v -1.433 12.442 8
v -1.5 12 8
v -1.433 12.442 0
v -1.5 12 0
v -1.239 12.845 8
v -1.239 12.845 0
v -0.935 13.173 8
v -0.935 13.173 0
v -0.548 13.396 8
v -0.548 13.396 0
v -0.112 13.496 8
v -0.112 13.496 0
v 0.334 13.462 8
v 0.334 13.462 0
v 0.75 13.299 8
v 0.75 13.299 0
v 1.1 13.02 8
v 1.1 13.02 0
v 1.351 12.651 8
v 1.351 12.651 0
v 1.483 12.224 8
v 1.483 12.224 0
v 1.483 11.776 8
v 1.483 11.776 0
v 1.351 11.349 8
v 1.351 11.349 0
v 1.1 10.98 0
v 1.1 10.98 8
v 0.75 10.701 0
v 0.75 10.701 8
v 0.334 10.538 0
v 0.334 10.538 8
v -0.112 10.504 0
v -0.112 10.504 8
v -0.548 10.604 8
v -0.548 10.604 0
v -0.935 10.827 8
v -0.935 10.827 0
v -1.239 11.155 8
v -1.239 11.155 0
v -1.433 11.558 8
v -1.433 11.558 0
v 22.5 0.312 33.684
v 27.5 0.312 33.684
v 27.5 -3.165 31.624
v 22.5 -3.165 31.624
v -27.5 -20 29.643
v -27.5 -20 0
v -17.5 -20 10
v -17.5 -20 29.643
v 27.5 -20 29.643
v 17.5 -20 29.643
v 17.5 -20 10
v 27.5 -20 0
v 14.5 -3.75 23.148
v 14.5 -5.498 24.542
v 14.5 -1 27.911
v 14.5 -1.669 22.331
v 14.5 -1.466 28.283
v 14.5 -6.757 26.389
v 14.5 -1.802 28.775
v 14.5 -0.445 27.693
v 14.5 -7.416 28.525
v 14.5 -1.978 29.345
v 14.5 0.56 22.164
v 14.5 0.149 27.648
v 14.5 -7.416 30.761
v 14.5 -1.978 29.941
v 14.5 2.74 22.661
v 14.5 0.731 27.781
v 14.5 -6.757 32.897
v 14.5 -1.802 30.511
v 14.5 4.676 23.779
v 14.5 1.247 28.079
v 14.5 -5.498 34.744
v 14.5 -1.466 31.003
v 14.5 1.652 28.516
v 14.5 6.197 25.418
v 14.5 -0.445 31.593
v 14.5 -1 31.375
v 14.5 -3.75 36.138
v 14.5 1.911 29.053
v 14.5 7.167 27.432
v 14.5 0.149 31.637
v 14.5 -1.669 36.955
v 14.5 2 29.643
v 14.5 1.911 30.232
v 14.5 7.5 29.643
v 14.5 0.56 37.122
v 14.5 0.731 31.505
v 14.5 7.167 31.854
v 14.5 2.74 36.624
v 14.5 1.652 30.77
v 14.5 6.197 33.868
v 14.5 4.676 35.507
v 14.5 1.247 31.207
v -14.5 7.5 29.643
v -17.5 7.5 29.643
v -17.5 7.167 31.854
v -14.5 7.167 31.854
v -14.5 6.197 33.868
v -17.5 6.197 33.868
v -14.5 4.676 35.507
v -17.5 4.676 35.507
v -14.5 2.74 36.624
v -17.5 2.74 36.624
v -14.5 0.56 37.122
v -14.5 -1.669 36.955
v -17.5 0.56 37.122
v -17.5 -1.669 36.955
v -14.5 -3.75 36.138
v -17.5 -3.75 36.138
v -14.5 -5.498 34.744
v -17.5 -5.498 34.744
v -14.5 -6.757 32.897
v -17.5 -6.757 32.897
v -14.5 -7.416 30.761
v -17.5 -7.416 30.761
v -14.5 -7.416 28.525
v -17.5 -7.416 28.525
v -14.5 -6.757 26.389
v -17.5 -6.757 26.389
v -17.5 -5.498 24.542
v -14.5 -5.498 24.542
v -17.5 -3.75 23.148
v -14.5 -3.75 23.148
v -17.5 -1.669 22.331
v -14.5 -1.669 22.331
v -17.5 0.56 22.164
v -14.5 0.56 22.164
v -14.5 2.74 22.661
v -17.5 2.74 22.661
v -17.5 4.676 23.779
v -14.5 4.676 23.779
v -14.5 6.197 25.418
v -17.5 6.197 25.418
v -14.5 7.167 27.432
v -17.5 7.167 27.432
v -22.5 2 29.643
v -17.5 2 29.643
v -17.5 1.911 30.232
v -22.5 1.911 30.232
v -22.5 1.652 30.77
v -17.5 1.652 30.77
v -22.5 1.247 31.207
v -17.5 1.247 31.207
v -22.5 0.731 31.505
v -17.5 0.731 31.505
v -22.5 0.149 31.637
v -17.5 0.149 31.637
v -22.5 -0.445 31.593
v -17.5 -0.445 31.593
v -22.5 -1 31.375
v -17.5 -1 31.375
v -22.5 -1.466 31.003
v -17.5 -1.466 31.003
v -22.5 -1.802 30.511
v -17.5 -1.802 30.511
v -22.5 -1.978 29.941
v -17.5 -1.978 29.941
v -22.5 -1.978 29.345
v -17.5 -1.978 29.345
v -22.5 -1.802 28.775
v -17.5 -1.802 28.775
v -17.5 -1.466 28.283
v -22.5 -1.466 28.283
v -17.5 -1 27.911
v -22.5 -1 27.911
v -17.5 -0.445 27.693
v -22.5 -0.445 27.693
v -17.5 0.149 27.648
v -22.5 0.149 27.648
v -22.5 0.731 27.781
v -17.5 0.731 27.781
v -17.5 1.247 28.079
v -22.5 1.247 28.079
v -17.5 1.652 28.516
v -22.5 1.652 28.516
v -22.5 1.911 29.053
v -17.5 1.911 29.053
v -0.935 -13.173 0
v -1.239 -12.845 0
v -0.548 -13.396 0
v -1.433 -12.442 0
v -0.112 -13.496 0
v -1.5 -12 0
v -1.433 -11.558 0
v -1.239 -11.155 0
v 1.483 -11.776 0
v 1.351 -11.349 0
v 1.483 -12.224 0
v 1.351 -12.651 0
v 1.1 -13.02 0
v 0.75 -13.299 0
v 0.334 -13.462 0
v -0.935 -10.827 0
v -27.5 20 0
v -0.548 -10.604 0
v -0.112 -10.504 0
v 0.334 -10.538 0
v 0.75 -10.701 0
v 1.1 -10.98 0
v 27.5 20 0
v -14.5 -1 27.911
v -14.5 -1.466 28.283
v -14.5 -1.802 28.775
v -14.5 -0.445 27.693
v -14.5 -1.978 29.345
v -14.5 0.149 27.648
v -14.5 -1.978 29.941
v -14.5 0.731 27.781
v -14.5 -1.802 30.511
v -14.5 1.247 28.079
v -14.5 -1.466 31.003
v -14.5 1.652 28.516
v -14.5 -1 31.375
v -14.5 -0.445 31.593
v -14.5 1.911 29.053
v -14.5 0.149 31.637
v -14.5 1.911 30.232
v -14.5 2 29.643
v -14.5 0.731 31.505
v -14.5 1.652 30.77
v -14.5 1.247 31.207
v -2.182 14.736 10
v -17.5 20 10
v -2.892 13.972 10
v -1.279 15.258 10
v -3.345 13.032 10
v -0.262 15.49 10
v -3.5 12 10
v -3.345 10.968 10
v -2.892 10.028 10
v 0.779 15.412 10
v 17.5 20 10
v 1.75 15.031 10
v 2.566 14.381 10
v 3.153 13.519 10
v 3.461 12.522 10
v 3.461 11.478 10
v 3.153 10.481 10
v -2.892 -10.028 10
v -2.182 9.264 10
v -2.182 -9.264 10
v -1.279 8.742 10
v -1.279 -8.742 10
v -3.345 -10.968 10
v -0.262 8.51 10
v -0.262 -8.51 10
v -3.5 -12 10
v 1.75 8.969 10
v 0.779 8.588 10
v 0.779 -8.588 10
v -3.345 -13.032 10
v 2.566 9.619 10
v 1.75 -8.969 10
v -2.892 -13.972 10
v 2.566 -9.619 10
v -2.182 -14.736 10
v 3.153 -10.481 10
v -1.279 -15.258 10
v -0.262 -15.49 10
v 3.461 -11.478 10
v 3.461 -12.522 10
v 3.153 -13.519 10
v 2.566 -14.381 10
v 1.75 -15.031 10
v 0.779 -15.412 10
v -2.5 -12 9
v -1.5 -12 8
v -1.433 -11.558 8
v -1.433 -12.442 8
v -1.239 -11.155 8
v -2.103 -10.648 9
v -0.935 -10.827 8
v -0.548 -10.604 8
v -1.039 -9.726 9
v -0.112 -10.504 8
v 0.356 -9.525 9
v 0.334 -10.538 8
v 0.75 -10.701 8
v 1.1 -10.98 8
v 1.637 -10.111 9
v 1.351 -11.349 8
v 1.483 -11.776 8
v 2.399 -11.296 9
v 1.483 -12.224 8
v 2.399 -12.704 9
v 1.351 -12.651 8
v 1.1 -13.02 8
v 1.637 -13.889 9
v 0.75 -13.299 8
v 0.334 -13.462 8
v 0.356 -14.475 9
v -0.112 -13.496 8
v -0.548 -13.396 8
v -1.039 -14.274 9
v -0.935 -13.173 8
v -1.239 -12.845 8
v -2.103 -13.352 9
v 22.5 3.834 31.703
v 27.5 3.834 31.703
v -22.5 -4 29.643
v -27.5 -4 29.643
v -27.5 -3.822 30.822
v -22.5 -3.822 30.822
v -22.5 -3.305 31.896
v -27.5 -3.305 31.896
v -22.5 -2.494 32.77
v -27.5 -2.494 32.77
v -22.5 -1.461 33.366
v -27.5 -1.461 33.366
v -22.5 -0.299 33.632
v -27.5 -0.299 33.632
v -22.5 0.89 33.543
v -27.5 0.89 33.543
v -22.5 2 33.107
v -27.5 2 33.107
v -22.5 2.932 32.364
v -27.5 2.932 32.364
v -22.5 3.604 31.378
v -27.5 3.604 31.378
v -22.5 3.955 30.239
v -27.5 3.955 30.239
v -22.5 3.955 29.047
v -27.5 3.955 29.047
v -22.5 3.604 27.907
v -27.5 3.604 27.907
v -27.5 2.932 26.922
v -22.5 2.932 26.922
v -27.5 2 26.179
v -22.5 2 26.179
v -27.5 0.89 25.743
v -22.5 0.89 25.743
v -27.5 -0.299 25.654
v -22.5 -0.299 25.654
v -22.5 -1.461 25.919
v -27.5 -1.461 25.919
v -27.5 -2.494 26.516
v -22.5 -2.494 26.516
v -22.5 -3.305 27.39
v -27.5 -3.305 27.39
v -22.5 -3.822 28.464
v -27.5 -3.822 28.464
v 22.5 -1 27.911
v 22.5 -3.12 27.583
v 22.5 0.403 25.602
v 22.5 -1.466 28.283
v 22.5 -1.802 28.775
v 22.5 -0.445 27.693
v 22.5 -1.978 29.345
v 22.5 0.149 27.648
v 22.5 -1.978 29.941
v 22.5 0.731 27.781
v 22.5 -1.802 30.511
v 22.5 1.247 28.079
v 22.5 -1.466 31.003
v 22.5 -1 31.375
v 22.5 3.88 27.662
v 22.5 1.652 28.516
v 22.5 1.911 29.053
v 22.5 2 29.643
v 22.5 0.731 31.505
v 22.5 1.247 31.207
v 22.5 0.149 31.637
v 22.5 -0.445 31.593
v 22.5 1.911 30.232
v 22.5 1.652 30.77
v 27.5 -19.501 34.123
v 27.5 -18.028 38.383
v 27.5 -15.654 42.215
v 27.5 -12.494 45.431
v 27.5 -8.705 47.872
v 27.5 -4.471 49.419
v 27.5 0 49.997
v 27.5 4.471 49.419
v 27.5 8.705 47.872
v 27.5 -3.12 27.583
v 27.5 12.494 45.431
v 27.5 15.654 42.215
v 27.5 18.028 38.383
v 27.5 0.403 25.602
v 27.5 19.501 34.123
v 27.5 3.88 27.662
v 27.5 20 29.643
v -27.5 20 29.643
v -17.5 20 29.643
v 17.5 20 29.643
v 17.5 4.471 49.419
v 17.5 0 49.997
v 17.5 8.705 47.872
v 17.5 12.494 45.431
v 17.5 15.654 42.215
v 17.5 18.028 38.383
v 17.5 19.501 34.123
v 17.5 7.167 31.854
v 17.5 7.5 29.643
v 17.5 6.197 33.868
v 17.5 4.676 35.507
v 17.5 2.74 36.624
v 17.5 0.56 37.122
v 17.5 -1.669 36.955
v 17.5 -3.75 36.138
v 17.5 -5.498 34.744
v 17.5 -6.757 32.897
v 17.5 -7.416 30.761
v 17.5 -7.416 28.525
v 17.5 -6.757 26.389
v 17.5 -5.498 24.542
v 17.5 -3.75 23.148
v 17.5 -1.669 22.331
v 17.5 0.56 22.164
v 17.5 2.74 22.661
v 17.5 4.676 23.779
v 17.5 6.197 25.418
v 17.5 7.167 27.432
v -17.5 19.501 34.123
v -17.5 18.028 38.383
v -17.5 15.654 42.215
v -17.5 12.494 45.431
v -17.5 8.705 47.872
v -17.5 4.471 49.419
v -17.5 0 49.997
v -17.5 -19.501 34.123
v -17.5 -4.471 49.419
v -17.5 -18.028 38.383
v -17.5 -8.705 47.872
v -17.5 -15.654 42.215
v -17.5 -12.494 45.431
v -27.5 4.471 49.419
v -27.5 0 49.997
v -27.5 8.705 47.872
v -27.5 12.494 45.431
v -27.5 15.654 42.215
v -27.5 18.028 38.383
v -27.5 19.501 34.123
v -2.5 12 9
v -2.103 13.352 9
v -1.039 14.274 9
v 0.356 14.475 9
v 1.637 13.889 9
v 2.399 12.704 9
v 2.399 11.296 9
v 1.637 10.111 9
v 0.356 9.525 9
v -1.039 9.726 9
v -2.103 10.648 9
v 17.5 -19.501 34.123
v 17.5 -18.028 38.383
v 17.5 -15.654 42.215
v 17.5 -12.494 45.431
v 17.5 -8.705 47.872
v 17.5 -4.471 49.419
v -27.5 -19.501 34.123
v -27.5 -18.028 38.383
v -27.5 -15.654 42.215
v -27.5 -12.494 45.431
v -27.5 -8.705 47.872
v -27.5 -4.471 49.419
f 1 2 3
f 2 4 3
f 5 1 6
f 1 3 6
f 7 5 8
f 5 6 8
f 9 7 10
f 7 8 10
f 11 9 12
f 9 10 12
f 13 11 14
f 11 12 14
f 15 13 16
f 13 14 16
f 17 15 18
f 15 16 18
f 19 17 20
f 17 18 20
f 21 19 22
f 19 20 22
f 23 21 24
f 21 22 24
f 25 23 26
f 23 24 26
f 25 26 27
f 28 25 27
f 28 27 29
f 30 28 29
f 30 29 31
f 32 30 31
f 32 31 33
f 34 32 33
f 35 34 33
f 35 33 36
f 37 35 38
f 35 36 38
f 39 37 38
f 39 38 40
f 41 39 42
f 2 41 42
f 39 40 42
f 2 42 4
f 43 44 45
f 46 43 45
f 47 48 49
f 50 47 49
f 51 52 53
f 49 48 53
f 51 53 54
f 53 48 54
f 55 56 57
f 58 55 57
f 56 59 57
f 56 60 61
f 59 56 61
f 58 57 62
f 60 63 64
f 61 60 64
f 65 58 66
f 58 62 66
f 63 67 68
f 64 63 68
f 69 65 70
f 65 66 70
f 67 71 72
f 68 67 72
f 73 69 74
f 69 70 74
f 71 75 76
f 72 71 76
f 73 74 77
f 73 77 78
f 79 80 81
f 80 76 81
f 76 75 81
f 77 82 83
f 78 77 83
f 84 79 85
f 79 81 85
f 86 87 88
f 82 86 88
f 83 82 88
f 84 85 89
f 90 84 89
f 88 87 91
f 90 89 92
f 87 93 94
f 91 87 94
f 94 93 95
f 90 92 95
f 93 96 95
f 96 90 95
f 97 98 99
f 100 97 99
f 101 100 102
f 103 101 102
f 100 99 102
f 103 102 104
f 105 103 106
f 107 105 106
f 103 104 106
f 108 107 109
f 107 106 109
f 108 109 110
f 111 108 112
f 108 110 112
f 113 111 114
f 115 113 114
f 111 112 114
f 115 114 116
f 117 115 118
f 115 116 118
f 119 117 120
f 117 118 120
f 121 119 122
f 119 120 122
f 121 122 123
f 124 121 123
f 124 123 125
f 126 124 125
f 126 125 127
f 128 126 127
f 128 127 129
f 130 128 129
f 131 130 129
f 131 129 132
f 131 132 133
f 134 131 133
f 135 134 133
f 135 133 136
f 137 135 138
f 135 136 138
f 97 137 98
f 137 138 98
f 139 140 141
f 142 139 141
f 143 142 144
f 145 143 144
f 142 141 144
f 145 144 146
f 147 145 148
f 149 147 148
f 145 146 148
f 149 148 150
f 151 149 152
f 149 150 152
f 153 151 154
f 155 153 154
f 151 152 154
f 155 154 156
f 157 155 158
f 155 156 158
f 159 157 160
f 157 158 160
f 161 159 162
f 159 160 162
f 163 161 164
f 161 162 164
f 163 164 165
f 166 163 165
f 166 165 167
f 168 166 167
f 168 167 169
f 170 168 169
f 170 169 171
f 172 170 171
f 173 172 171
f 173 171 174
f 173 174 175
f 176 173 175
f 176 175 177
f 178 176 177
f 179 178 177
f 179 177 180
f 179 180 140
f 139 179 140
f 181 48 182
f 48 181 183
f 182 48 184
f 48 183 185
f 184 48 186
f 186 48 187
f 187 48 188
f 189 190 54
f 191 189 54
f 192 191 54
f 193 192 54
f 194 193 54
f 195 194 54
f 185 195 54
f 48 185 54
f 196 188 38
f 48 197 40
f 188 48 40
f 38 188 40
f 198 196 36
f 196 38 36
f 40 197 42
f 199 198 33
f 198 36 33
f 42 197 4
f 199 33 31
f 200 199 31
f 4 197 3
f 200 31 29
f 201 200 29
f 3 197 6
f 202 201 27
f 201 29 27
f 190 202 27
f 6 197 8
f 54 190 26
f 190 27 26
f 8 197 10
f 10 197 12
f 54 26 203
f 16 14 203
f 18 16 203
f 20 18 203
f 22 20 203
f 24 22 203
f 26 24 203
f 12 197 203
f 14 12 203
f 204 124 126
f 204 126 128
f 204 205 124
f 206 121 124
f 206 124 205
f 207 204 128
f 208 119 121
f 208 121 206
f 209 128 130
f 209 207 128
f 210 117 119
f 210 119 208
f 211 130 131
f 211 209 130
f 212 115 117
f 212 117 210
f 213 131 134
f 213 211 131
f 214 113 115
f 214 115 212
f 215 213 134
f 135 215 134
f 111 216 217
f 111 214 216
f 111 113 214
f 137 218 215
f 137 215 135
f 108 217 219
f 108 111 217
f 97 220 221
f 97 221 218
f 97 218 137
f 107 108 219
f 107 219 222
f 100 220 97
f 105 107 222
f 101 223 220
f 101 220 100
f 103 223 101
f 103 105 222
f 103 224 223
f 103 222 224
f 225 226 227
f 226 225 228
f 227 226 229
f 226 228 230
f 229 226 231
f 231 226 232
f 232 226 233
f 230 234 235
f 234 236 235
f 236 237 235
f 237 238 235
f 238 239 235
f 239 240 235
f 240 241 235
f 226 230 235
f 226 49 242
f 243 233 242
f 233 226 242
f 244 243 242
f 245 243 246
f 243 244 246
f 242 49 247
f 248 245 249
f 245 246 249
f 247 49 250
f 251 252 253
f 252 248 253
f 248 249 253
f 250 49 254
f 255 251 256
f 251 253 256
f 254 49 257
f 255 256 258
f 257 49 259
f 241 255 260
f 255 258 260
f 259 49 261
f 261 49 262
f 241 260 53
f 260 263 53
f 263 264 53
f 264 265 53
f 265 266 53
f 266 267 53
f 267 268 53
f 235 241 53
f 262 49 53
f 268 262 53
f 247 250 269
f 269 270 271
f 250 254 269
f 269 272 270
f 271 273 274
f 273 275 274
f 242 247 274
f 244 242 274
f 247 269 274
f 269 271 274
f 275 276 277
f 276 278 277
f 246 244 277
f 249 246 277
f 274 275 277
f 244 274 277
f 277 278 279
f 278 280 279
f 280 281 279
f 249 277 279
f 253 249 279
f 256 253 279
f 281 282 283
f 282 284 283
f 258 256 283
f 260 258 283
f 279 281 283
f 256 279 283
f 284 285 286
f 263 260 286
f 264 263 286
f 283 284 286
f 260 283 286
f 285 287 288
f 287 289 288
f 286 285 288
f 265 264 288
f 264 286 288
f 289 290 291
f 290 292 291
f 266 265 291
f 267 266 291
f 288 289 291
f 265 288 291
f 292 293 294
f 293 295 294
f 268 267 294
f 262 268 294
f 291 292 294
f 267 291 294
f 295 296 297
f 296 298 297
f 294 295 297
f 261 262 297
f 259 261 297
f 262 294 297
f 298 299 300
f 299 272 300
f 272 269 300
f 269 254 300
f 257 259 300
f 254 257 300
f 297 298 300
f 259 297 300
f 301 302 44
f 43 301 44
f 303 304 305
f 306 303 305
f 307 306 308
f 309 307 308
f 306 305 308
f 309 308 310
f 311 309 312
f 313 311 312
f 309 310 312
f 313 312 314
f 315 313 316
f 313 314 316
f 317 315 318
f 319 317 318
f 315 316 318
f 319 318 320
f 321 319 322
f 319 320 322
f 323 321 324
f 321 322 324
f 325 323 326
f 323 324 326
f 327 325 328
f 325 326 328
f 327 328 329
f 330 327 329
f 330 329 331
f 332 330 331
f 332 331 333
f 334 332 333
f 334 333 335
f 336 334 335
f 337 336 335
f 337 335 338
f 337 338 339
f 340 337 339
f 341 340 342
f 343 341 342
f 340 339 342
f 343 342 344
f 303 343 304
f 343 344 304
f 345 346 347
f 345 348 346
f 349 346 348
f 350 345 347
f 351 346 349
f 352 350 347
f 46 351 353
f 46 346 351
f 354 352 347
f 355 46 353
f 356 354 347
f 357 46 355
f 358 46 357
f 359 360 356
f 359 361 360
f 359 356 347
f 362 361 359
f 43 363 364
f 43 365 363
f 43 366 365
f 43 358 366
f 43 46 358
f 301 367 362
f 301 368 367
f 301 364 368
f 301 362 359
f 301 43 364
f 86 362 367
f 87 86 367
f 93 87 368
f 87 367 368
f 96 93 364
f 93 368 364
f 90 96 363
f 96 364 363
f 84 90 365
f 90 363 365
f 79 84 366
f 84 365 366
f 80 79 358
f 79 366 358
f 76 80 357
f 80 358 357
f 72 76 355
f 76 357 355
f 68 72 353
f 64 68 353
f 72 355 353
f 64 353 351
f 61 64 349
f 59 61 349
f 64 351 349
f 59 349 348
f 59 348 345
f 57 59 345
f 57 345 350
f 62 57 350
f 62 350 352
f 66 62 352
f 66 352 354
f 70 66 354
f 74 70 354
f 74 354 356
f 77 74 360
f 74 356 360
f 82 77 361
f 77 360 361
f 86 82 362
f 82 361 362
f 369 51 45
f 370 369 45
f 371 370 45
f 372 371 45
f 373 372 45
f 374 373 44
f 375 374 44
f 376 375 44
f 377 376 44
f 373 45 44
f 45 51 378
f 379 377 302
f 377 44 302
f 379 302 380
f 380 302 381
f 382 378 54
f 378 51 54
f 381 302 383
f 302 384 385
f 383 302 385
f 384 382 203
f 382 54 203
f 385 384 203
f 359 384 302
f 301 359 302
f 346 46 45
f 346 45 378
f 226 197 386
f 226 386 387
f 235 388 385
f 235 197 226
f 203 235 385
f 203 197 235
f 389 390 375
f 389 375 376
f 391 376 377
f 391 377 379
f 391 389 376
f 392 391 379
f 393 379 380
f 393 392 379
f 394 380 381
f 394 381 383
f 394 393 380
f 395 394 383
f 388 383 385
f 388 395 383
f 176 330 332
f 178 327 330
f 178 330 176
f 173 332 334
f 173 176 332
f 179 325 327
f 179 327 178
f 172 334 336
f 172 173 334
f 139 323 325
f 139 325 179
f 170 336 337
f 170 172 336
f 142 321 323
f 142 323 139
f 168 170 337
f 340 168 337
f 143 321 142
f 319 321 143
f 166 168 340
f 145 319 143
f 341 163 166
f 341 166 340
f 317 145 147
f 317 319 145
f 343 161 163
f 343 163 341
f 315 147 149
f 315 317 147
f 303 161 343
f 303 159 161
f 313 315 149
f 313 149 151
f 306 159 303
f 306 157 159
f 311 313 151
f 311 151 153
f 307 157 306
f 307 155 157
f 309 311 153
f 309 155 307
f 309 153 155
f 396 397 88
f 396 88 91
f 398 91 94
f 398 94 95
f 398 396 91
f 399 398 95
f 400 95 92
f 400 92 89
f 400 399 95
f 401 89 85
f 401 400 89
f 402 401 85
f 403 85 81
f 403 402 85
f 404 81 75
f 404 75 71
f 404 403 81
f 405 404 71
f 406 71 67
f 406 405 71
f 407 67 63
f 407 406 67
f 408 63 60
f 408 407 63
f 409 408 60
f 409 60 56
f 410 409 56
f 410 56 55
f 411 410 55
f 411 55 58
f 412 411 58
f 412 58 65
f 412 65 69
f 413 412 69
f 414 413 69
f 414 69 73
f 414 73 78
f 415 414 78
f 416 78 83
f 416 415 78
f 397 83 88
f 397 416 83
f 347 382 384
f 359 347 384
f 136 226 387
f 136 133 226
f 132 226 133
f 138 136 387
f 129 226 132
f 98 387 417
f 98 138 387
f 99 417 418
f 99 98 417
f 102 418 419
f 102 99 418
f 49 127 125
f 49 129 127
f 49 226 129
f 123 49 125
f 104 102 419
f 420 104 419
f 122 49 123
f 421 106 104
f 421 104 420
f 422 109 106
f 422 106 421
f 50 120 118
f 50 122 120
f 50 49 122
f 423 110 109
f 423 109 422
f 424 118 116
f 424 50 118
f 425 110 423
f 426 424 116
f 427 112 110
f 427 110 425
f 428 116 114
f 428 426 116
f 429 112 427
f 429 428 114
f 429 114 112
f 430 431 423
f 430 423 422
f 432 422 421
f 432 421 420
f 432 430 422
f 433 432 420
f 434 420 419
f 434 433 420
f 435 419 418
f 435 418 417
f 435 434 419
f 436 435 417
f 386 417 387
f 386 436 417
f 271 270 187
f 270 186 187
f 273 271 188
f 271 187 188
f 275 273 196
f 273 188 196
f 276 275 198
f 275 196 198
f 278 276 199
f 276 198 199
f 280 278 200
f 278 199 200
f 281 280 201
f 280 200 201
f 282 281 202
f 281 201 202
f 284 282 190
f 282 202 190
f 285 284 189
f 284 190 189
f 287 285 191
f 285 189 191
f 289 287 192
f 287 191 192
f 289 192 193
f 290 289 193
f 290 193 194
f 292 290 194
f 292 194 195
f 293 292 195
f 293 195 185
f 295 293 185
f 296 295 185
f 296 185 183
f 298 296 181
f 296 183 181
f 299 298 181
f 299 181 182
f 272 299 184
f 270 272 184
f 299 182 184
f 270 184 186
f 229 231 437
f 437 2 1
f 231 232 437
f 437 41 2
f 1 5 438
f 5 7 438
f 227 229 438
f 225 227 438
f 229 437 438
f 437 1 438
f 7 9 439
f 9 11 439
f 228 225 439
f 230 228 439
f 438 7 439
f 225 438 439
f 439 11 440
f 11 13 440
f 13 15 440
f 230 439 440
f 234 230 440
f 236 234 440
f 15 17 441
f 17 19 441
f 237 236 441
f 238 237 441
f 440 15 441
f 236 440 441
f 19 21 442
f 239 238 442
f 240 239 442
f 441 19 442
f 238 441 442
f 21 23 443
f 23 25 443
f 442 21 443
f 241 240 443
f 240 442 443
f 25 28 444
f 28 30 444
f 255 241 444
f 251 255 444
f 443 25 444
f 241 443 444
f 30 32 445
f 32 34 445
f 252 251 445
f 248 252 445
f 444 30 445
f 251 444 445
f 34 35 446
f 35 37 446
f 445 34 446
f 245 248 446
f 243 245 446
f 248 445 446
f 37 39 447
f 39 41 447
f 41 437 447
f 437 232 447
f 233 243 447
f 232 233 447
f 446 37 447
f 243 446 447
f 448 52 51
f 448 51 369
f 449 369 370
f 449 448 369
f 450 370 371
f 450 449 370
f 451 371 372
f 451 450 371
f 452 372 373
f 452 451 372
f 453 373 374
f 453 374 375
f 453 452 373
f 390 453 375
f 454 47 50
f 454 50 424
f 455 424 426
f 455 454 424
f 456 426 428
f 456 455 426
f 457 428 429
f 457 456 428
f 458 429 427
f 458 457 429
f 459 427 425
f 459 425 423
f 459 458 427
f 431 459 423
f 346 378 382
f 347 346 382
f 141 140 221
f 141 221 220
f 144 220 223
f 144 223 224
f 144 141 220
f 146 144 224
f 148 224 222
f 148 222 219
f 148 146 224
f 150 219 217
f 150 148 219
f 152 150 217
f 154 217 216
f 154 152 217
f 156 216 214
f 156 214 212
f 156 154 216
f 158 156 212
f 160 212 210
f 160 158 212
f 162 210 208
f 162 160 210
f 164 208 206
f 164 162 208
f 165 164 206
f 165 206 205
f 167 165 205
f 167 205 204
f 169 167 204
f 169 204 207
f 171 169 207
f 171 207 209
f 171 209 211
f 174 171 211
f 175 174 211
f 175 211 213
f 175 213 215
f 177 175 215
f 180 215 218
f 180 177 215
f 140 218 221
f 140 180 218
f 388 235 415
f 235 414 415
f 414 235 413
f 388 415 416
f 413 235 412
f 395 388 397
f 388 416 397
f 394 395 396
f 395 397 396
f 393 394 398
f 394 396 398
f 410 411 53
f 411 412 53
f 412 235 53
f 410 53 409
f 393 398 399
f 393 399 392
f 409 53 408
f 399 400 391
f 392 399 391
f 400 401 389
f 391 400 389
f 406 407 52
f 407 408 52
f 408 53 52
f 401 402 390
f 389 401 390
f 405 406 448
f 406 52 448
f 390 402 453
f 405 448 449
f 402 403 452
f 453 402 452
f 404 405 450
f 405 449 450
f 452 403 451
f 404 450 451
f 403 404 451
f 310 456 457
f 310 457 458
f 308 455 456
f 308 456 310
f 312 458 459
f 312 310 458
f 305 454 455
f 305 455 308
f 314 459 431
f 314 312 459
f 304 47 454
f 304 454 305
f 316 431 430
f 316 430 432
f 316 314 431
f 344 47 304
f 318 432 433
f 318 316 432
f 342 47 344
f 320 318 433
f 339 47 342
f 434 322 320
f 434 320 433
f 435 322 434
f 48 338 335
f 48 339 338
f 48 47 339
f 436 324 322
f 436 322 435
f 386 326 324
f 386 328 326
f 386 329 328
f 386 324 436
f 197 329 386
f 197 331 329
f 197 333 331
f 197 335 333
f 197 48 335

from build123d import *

# Parameters (mm, degrees)
F0_W           = 55
F0_H           = 40
F12_DEPTH      = 50
F1_W           = 35
F1_H           = 40
F13_DEPTH      = 40.001
F14_T1_DEPTH   = 111.7855168217
F14_T3_DEPTH   = 111.7855168217
F15_R          = 2
F2_DEPTH       = 55.001
F3_R           = 7.5
F3_R_2         = 2
F16_DEPTH      = 3
F6_D           = 3
F6_CSINK_D     = 7
F6_CSINK_ANGLE = 90
F7_R           = 2
F8_DEPTH       = 5
F17_R          = 4
F17_R_2        = 2
F9_DEPTH       = 5


# Not quite as in the source:
# - a fillet or chamfer that OpenCascade refuses, or shapes differently, is made with other operations: its cross-section is extruded or revolved along the edge and cut away or added


with BuildPart() as f12:
    # F0 (on Top) → F12 (new body)
    with BuildSketch(Plane.XY):
        Rectangle(F0_W, F0_H)
    extrude(amount=F12_DEPTH)

    # F1 (on face) → F13 (cut, through all)
    with BuildSketch(Plane.XZ.offset(20)):
        with Locations((0, 30)):
            Rectangle(F1_W, F1_H)
    extrude(amount=-F13_DEPTH, mode=Mode.SUBTRACT)

    # F14: fillet of radius 20.3571033643 on 4 edges, made by hand

    # F14_s2 → F14_t1 (cut)
    with BuildSketch(Plane.YZ.offset(-33.3927584109)):
        with BuildLine():
            ThreePointArc((-20, 29.6428966357), (-14.0375424699, 44.0375424699), (0.3571033643, 50))
            Line((0.3571033643, 50), (-20, 50))
            Line((-20, 50), (-20, 29.6428966357))
        make_face()
        with BuildLine():
            ThreePointArc((-0.3571033643, 50), (14.0375424699, 44.0375424699), (20, 29.6428966357))
            Line((20, 29.6428966357), (20, 50))
            Line((20, 50), (-0.3571033643, 50))
        make_face()
    extrude(amount=F14_T1_DEPTH, mode=Mode.SUBTRACT)

    # F14_s4 → F14_t3 (cut)
    with BuildSketch(Plane.YZ.offset(-78.3927584109)):
        with BuildLine():
            ThreePointArc((-20, 29.6428966357), (-14.0375424699, 44.0375424699), (0.3571033643, 50))
            Line((0.3571033643, 50), (-20, 50))
            Line((-20, 50), (-20, 29.6428966357))
        make_face()
        with BuildLine():
            ThreePointArc((-0.3571033643, 50), (14.0375424699, 44.0375424699), (20, 29.6428966357))
            Line((20, 29.6428966357), (20, 50))
            Line((20, 50), (-0.3571033643, 50))
        make_face()
    extrude(amount=F14_T3_DEPTH, mode=Mode.SUBTRACT)

    # F15 (on face) → F2 (cut, through all)
    with BuildSketch(Plane.YZ.offset(27.5)):
        with Locations((0, 29.6428966357)):
            Circle(F15_R)
    extrude(amount=-F2_DEPTH, mode=Mode.SUBTRACT)

    # F3 (on face) → F16 (join)
    with BuildSketch(Plane.YZ.offset(-17.5)):
        with Locations((0, 29.6428966357)):
            Circle(F3_R)
        with Locations((0, 29.6428966357)):
            Circle(F3_R_2, mode=Mode.SUBTRACT)
    extrude(amount=F16_DEPTH)

    # F4: F12 across plane


with BuildPart() as f12_1:
    add(f12.part)
    add(f12.part.mirror(Plane.YZ))

    # F6 (through all)
    with Locations(Plane.XY.offset(10)):
        with Locations((0, 12), (0, -12)):
            CounterSinkHole(F6_D / 2, F6_CSINK_D / 2, counter_sink_angle=F6_CSINK_ANGLE)

    # F7 (on face) → F8 (cut)
    with BuildSketch(Plane.YZ.offset(27.5)):
        Polygon((0.4025775089, 25.6017005954), (3.8796188691, 27.6616803799), (3.8341447246, 31.7028764202), (0.3116292198, 33.6840926759), (-3.1654121404, 31.6241128914), (-3.1199379959, 27.5829168512), align=None)
        with Locations((0, 29.6428966357)):
            Circle(F7_R, mode=Mode.SUBTRACT)
    extrude(amount=-F8_DEPTH, mode=Mode.SUBTRACT)

    # F17 (on face) → F9 (cut)
    with BuildSketch(Plane(origin=(-27.5, 0, 0), x_dir=(0, -1, 0), z_dir=(-1, 0, 0))):
        with Locations((0, 29.6428966357)):
            Circle(F17_R)
        with Locations((0, 29.6428966357)):
            Circle(F17_R_2, mode=Mode.SUBTRACT)
    extrude(amount=-F9_DEPTH, mode=Mode.SUBTRACT)


solid = f12_1.part
